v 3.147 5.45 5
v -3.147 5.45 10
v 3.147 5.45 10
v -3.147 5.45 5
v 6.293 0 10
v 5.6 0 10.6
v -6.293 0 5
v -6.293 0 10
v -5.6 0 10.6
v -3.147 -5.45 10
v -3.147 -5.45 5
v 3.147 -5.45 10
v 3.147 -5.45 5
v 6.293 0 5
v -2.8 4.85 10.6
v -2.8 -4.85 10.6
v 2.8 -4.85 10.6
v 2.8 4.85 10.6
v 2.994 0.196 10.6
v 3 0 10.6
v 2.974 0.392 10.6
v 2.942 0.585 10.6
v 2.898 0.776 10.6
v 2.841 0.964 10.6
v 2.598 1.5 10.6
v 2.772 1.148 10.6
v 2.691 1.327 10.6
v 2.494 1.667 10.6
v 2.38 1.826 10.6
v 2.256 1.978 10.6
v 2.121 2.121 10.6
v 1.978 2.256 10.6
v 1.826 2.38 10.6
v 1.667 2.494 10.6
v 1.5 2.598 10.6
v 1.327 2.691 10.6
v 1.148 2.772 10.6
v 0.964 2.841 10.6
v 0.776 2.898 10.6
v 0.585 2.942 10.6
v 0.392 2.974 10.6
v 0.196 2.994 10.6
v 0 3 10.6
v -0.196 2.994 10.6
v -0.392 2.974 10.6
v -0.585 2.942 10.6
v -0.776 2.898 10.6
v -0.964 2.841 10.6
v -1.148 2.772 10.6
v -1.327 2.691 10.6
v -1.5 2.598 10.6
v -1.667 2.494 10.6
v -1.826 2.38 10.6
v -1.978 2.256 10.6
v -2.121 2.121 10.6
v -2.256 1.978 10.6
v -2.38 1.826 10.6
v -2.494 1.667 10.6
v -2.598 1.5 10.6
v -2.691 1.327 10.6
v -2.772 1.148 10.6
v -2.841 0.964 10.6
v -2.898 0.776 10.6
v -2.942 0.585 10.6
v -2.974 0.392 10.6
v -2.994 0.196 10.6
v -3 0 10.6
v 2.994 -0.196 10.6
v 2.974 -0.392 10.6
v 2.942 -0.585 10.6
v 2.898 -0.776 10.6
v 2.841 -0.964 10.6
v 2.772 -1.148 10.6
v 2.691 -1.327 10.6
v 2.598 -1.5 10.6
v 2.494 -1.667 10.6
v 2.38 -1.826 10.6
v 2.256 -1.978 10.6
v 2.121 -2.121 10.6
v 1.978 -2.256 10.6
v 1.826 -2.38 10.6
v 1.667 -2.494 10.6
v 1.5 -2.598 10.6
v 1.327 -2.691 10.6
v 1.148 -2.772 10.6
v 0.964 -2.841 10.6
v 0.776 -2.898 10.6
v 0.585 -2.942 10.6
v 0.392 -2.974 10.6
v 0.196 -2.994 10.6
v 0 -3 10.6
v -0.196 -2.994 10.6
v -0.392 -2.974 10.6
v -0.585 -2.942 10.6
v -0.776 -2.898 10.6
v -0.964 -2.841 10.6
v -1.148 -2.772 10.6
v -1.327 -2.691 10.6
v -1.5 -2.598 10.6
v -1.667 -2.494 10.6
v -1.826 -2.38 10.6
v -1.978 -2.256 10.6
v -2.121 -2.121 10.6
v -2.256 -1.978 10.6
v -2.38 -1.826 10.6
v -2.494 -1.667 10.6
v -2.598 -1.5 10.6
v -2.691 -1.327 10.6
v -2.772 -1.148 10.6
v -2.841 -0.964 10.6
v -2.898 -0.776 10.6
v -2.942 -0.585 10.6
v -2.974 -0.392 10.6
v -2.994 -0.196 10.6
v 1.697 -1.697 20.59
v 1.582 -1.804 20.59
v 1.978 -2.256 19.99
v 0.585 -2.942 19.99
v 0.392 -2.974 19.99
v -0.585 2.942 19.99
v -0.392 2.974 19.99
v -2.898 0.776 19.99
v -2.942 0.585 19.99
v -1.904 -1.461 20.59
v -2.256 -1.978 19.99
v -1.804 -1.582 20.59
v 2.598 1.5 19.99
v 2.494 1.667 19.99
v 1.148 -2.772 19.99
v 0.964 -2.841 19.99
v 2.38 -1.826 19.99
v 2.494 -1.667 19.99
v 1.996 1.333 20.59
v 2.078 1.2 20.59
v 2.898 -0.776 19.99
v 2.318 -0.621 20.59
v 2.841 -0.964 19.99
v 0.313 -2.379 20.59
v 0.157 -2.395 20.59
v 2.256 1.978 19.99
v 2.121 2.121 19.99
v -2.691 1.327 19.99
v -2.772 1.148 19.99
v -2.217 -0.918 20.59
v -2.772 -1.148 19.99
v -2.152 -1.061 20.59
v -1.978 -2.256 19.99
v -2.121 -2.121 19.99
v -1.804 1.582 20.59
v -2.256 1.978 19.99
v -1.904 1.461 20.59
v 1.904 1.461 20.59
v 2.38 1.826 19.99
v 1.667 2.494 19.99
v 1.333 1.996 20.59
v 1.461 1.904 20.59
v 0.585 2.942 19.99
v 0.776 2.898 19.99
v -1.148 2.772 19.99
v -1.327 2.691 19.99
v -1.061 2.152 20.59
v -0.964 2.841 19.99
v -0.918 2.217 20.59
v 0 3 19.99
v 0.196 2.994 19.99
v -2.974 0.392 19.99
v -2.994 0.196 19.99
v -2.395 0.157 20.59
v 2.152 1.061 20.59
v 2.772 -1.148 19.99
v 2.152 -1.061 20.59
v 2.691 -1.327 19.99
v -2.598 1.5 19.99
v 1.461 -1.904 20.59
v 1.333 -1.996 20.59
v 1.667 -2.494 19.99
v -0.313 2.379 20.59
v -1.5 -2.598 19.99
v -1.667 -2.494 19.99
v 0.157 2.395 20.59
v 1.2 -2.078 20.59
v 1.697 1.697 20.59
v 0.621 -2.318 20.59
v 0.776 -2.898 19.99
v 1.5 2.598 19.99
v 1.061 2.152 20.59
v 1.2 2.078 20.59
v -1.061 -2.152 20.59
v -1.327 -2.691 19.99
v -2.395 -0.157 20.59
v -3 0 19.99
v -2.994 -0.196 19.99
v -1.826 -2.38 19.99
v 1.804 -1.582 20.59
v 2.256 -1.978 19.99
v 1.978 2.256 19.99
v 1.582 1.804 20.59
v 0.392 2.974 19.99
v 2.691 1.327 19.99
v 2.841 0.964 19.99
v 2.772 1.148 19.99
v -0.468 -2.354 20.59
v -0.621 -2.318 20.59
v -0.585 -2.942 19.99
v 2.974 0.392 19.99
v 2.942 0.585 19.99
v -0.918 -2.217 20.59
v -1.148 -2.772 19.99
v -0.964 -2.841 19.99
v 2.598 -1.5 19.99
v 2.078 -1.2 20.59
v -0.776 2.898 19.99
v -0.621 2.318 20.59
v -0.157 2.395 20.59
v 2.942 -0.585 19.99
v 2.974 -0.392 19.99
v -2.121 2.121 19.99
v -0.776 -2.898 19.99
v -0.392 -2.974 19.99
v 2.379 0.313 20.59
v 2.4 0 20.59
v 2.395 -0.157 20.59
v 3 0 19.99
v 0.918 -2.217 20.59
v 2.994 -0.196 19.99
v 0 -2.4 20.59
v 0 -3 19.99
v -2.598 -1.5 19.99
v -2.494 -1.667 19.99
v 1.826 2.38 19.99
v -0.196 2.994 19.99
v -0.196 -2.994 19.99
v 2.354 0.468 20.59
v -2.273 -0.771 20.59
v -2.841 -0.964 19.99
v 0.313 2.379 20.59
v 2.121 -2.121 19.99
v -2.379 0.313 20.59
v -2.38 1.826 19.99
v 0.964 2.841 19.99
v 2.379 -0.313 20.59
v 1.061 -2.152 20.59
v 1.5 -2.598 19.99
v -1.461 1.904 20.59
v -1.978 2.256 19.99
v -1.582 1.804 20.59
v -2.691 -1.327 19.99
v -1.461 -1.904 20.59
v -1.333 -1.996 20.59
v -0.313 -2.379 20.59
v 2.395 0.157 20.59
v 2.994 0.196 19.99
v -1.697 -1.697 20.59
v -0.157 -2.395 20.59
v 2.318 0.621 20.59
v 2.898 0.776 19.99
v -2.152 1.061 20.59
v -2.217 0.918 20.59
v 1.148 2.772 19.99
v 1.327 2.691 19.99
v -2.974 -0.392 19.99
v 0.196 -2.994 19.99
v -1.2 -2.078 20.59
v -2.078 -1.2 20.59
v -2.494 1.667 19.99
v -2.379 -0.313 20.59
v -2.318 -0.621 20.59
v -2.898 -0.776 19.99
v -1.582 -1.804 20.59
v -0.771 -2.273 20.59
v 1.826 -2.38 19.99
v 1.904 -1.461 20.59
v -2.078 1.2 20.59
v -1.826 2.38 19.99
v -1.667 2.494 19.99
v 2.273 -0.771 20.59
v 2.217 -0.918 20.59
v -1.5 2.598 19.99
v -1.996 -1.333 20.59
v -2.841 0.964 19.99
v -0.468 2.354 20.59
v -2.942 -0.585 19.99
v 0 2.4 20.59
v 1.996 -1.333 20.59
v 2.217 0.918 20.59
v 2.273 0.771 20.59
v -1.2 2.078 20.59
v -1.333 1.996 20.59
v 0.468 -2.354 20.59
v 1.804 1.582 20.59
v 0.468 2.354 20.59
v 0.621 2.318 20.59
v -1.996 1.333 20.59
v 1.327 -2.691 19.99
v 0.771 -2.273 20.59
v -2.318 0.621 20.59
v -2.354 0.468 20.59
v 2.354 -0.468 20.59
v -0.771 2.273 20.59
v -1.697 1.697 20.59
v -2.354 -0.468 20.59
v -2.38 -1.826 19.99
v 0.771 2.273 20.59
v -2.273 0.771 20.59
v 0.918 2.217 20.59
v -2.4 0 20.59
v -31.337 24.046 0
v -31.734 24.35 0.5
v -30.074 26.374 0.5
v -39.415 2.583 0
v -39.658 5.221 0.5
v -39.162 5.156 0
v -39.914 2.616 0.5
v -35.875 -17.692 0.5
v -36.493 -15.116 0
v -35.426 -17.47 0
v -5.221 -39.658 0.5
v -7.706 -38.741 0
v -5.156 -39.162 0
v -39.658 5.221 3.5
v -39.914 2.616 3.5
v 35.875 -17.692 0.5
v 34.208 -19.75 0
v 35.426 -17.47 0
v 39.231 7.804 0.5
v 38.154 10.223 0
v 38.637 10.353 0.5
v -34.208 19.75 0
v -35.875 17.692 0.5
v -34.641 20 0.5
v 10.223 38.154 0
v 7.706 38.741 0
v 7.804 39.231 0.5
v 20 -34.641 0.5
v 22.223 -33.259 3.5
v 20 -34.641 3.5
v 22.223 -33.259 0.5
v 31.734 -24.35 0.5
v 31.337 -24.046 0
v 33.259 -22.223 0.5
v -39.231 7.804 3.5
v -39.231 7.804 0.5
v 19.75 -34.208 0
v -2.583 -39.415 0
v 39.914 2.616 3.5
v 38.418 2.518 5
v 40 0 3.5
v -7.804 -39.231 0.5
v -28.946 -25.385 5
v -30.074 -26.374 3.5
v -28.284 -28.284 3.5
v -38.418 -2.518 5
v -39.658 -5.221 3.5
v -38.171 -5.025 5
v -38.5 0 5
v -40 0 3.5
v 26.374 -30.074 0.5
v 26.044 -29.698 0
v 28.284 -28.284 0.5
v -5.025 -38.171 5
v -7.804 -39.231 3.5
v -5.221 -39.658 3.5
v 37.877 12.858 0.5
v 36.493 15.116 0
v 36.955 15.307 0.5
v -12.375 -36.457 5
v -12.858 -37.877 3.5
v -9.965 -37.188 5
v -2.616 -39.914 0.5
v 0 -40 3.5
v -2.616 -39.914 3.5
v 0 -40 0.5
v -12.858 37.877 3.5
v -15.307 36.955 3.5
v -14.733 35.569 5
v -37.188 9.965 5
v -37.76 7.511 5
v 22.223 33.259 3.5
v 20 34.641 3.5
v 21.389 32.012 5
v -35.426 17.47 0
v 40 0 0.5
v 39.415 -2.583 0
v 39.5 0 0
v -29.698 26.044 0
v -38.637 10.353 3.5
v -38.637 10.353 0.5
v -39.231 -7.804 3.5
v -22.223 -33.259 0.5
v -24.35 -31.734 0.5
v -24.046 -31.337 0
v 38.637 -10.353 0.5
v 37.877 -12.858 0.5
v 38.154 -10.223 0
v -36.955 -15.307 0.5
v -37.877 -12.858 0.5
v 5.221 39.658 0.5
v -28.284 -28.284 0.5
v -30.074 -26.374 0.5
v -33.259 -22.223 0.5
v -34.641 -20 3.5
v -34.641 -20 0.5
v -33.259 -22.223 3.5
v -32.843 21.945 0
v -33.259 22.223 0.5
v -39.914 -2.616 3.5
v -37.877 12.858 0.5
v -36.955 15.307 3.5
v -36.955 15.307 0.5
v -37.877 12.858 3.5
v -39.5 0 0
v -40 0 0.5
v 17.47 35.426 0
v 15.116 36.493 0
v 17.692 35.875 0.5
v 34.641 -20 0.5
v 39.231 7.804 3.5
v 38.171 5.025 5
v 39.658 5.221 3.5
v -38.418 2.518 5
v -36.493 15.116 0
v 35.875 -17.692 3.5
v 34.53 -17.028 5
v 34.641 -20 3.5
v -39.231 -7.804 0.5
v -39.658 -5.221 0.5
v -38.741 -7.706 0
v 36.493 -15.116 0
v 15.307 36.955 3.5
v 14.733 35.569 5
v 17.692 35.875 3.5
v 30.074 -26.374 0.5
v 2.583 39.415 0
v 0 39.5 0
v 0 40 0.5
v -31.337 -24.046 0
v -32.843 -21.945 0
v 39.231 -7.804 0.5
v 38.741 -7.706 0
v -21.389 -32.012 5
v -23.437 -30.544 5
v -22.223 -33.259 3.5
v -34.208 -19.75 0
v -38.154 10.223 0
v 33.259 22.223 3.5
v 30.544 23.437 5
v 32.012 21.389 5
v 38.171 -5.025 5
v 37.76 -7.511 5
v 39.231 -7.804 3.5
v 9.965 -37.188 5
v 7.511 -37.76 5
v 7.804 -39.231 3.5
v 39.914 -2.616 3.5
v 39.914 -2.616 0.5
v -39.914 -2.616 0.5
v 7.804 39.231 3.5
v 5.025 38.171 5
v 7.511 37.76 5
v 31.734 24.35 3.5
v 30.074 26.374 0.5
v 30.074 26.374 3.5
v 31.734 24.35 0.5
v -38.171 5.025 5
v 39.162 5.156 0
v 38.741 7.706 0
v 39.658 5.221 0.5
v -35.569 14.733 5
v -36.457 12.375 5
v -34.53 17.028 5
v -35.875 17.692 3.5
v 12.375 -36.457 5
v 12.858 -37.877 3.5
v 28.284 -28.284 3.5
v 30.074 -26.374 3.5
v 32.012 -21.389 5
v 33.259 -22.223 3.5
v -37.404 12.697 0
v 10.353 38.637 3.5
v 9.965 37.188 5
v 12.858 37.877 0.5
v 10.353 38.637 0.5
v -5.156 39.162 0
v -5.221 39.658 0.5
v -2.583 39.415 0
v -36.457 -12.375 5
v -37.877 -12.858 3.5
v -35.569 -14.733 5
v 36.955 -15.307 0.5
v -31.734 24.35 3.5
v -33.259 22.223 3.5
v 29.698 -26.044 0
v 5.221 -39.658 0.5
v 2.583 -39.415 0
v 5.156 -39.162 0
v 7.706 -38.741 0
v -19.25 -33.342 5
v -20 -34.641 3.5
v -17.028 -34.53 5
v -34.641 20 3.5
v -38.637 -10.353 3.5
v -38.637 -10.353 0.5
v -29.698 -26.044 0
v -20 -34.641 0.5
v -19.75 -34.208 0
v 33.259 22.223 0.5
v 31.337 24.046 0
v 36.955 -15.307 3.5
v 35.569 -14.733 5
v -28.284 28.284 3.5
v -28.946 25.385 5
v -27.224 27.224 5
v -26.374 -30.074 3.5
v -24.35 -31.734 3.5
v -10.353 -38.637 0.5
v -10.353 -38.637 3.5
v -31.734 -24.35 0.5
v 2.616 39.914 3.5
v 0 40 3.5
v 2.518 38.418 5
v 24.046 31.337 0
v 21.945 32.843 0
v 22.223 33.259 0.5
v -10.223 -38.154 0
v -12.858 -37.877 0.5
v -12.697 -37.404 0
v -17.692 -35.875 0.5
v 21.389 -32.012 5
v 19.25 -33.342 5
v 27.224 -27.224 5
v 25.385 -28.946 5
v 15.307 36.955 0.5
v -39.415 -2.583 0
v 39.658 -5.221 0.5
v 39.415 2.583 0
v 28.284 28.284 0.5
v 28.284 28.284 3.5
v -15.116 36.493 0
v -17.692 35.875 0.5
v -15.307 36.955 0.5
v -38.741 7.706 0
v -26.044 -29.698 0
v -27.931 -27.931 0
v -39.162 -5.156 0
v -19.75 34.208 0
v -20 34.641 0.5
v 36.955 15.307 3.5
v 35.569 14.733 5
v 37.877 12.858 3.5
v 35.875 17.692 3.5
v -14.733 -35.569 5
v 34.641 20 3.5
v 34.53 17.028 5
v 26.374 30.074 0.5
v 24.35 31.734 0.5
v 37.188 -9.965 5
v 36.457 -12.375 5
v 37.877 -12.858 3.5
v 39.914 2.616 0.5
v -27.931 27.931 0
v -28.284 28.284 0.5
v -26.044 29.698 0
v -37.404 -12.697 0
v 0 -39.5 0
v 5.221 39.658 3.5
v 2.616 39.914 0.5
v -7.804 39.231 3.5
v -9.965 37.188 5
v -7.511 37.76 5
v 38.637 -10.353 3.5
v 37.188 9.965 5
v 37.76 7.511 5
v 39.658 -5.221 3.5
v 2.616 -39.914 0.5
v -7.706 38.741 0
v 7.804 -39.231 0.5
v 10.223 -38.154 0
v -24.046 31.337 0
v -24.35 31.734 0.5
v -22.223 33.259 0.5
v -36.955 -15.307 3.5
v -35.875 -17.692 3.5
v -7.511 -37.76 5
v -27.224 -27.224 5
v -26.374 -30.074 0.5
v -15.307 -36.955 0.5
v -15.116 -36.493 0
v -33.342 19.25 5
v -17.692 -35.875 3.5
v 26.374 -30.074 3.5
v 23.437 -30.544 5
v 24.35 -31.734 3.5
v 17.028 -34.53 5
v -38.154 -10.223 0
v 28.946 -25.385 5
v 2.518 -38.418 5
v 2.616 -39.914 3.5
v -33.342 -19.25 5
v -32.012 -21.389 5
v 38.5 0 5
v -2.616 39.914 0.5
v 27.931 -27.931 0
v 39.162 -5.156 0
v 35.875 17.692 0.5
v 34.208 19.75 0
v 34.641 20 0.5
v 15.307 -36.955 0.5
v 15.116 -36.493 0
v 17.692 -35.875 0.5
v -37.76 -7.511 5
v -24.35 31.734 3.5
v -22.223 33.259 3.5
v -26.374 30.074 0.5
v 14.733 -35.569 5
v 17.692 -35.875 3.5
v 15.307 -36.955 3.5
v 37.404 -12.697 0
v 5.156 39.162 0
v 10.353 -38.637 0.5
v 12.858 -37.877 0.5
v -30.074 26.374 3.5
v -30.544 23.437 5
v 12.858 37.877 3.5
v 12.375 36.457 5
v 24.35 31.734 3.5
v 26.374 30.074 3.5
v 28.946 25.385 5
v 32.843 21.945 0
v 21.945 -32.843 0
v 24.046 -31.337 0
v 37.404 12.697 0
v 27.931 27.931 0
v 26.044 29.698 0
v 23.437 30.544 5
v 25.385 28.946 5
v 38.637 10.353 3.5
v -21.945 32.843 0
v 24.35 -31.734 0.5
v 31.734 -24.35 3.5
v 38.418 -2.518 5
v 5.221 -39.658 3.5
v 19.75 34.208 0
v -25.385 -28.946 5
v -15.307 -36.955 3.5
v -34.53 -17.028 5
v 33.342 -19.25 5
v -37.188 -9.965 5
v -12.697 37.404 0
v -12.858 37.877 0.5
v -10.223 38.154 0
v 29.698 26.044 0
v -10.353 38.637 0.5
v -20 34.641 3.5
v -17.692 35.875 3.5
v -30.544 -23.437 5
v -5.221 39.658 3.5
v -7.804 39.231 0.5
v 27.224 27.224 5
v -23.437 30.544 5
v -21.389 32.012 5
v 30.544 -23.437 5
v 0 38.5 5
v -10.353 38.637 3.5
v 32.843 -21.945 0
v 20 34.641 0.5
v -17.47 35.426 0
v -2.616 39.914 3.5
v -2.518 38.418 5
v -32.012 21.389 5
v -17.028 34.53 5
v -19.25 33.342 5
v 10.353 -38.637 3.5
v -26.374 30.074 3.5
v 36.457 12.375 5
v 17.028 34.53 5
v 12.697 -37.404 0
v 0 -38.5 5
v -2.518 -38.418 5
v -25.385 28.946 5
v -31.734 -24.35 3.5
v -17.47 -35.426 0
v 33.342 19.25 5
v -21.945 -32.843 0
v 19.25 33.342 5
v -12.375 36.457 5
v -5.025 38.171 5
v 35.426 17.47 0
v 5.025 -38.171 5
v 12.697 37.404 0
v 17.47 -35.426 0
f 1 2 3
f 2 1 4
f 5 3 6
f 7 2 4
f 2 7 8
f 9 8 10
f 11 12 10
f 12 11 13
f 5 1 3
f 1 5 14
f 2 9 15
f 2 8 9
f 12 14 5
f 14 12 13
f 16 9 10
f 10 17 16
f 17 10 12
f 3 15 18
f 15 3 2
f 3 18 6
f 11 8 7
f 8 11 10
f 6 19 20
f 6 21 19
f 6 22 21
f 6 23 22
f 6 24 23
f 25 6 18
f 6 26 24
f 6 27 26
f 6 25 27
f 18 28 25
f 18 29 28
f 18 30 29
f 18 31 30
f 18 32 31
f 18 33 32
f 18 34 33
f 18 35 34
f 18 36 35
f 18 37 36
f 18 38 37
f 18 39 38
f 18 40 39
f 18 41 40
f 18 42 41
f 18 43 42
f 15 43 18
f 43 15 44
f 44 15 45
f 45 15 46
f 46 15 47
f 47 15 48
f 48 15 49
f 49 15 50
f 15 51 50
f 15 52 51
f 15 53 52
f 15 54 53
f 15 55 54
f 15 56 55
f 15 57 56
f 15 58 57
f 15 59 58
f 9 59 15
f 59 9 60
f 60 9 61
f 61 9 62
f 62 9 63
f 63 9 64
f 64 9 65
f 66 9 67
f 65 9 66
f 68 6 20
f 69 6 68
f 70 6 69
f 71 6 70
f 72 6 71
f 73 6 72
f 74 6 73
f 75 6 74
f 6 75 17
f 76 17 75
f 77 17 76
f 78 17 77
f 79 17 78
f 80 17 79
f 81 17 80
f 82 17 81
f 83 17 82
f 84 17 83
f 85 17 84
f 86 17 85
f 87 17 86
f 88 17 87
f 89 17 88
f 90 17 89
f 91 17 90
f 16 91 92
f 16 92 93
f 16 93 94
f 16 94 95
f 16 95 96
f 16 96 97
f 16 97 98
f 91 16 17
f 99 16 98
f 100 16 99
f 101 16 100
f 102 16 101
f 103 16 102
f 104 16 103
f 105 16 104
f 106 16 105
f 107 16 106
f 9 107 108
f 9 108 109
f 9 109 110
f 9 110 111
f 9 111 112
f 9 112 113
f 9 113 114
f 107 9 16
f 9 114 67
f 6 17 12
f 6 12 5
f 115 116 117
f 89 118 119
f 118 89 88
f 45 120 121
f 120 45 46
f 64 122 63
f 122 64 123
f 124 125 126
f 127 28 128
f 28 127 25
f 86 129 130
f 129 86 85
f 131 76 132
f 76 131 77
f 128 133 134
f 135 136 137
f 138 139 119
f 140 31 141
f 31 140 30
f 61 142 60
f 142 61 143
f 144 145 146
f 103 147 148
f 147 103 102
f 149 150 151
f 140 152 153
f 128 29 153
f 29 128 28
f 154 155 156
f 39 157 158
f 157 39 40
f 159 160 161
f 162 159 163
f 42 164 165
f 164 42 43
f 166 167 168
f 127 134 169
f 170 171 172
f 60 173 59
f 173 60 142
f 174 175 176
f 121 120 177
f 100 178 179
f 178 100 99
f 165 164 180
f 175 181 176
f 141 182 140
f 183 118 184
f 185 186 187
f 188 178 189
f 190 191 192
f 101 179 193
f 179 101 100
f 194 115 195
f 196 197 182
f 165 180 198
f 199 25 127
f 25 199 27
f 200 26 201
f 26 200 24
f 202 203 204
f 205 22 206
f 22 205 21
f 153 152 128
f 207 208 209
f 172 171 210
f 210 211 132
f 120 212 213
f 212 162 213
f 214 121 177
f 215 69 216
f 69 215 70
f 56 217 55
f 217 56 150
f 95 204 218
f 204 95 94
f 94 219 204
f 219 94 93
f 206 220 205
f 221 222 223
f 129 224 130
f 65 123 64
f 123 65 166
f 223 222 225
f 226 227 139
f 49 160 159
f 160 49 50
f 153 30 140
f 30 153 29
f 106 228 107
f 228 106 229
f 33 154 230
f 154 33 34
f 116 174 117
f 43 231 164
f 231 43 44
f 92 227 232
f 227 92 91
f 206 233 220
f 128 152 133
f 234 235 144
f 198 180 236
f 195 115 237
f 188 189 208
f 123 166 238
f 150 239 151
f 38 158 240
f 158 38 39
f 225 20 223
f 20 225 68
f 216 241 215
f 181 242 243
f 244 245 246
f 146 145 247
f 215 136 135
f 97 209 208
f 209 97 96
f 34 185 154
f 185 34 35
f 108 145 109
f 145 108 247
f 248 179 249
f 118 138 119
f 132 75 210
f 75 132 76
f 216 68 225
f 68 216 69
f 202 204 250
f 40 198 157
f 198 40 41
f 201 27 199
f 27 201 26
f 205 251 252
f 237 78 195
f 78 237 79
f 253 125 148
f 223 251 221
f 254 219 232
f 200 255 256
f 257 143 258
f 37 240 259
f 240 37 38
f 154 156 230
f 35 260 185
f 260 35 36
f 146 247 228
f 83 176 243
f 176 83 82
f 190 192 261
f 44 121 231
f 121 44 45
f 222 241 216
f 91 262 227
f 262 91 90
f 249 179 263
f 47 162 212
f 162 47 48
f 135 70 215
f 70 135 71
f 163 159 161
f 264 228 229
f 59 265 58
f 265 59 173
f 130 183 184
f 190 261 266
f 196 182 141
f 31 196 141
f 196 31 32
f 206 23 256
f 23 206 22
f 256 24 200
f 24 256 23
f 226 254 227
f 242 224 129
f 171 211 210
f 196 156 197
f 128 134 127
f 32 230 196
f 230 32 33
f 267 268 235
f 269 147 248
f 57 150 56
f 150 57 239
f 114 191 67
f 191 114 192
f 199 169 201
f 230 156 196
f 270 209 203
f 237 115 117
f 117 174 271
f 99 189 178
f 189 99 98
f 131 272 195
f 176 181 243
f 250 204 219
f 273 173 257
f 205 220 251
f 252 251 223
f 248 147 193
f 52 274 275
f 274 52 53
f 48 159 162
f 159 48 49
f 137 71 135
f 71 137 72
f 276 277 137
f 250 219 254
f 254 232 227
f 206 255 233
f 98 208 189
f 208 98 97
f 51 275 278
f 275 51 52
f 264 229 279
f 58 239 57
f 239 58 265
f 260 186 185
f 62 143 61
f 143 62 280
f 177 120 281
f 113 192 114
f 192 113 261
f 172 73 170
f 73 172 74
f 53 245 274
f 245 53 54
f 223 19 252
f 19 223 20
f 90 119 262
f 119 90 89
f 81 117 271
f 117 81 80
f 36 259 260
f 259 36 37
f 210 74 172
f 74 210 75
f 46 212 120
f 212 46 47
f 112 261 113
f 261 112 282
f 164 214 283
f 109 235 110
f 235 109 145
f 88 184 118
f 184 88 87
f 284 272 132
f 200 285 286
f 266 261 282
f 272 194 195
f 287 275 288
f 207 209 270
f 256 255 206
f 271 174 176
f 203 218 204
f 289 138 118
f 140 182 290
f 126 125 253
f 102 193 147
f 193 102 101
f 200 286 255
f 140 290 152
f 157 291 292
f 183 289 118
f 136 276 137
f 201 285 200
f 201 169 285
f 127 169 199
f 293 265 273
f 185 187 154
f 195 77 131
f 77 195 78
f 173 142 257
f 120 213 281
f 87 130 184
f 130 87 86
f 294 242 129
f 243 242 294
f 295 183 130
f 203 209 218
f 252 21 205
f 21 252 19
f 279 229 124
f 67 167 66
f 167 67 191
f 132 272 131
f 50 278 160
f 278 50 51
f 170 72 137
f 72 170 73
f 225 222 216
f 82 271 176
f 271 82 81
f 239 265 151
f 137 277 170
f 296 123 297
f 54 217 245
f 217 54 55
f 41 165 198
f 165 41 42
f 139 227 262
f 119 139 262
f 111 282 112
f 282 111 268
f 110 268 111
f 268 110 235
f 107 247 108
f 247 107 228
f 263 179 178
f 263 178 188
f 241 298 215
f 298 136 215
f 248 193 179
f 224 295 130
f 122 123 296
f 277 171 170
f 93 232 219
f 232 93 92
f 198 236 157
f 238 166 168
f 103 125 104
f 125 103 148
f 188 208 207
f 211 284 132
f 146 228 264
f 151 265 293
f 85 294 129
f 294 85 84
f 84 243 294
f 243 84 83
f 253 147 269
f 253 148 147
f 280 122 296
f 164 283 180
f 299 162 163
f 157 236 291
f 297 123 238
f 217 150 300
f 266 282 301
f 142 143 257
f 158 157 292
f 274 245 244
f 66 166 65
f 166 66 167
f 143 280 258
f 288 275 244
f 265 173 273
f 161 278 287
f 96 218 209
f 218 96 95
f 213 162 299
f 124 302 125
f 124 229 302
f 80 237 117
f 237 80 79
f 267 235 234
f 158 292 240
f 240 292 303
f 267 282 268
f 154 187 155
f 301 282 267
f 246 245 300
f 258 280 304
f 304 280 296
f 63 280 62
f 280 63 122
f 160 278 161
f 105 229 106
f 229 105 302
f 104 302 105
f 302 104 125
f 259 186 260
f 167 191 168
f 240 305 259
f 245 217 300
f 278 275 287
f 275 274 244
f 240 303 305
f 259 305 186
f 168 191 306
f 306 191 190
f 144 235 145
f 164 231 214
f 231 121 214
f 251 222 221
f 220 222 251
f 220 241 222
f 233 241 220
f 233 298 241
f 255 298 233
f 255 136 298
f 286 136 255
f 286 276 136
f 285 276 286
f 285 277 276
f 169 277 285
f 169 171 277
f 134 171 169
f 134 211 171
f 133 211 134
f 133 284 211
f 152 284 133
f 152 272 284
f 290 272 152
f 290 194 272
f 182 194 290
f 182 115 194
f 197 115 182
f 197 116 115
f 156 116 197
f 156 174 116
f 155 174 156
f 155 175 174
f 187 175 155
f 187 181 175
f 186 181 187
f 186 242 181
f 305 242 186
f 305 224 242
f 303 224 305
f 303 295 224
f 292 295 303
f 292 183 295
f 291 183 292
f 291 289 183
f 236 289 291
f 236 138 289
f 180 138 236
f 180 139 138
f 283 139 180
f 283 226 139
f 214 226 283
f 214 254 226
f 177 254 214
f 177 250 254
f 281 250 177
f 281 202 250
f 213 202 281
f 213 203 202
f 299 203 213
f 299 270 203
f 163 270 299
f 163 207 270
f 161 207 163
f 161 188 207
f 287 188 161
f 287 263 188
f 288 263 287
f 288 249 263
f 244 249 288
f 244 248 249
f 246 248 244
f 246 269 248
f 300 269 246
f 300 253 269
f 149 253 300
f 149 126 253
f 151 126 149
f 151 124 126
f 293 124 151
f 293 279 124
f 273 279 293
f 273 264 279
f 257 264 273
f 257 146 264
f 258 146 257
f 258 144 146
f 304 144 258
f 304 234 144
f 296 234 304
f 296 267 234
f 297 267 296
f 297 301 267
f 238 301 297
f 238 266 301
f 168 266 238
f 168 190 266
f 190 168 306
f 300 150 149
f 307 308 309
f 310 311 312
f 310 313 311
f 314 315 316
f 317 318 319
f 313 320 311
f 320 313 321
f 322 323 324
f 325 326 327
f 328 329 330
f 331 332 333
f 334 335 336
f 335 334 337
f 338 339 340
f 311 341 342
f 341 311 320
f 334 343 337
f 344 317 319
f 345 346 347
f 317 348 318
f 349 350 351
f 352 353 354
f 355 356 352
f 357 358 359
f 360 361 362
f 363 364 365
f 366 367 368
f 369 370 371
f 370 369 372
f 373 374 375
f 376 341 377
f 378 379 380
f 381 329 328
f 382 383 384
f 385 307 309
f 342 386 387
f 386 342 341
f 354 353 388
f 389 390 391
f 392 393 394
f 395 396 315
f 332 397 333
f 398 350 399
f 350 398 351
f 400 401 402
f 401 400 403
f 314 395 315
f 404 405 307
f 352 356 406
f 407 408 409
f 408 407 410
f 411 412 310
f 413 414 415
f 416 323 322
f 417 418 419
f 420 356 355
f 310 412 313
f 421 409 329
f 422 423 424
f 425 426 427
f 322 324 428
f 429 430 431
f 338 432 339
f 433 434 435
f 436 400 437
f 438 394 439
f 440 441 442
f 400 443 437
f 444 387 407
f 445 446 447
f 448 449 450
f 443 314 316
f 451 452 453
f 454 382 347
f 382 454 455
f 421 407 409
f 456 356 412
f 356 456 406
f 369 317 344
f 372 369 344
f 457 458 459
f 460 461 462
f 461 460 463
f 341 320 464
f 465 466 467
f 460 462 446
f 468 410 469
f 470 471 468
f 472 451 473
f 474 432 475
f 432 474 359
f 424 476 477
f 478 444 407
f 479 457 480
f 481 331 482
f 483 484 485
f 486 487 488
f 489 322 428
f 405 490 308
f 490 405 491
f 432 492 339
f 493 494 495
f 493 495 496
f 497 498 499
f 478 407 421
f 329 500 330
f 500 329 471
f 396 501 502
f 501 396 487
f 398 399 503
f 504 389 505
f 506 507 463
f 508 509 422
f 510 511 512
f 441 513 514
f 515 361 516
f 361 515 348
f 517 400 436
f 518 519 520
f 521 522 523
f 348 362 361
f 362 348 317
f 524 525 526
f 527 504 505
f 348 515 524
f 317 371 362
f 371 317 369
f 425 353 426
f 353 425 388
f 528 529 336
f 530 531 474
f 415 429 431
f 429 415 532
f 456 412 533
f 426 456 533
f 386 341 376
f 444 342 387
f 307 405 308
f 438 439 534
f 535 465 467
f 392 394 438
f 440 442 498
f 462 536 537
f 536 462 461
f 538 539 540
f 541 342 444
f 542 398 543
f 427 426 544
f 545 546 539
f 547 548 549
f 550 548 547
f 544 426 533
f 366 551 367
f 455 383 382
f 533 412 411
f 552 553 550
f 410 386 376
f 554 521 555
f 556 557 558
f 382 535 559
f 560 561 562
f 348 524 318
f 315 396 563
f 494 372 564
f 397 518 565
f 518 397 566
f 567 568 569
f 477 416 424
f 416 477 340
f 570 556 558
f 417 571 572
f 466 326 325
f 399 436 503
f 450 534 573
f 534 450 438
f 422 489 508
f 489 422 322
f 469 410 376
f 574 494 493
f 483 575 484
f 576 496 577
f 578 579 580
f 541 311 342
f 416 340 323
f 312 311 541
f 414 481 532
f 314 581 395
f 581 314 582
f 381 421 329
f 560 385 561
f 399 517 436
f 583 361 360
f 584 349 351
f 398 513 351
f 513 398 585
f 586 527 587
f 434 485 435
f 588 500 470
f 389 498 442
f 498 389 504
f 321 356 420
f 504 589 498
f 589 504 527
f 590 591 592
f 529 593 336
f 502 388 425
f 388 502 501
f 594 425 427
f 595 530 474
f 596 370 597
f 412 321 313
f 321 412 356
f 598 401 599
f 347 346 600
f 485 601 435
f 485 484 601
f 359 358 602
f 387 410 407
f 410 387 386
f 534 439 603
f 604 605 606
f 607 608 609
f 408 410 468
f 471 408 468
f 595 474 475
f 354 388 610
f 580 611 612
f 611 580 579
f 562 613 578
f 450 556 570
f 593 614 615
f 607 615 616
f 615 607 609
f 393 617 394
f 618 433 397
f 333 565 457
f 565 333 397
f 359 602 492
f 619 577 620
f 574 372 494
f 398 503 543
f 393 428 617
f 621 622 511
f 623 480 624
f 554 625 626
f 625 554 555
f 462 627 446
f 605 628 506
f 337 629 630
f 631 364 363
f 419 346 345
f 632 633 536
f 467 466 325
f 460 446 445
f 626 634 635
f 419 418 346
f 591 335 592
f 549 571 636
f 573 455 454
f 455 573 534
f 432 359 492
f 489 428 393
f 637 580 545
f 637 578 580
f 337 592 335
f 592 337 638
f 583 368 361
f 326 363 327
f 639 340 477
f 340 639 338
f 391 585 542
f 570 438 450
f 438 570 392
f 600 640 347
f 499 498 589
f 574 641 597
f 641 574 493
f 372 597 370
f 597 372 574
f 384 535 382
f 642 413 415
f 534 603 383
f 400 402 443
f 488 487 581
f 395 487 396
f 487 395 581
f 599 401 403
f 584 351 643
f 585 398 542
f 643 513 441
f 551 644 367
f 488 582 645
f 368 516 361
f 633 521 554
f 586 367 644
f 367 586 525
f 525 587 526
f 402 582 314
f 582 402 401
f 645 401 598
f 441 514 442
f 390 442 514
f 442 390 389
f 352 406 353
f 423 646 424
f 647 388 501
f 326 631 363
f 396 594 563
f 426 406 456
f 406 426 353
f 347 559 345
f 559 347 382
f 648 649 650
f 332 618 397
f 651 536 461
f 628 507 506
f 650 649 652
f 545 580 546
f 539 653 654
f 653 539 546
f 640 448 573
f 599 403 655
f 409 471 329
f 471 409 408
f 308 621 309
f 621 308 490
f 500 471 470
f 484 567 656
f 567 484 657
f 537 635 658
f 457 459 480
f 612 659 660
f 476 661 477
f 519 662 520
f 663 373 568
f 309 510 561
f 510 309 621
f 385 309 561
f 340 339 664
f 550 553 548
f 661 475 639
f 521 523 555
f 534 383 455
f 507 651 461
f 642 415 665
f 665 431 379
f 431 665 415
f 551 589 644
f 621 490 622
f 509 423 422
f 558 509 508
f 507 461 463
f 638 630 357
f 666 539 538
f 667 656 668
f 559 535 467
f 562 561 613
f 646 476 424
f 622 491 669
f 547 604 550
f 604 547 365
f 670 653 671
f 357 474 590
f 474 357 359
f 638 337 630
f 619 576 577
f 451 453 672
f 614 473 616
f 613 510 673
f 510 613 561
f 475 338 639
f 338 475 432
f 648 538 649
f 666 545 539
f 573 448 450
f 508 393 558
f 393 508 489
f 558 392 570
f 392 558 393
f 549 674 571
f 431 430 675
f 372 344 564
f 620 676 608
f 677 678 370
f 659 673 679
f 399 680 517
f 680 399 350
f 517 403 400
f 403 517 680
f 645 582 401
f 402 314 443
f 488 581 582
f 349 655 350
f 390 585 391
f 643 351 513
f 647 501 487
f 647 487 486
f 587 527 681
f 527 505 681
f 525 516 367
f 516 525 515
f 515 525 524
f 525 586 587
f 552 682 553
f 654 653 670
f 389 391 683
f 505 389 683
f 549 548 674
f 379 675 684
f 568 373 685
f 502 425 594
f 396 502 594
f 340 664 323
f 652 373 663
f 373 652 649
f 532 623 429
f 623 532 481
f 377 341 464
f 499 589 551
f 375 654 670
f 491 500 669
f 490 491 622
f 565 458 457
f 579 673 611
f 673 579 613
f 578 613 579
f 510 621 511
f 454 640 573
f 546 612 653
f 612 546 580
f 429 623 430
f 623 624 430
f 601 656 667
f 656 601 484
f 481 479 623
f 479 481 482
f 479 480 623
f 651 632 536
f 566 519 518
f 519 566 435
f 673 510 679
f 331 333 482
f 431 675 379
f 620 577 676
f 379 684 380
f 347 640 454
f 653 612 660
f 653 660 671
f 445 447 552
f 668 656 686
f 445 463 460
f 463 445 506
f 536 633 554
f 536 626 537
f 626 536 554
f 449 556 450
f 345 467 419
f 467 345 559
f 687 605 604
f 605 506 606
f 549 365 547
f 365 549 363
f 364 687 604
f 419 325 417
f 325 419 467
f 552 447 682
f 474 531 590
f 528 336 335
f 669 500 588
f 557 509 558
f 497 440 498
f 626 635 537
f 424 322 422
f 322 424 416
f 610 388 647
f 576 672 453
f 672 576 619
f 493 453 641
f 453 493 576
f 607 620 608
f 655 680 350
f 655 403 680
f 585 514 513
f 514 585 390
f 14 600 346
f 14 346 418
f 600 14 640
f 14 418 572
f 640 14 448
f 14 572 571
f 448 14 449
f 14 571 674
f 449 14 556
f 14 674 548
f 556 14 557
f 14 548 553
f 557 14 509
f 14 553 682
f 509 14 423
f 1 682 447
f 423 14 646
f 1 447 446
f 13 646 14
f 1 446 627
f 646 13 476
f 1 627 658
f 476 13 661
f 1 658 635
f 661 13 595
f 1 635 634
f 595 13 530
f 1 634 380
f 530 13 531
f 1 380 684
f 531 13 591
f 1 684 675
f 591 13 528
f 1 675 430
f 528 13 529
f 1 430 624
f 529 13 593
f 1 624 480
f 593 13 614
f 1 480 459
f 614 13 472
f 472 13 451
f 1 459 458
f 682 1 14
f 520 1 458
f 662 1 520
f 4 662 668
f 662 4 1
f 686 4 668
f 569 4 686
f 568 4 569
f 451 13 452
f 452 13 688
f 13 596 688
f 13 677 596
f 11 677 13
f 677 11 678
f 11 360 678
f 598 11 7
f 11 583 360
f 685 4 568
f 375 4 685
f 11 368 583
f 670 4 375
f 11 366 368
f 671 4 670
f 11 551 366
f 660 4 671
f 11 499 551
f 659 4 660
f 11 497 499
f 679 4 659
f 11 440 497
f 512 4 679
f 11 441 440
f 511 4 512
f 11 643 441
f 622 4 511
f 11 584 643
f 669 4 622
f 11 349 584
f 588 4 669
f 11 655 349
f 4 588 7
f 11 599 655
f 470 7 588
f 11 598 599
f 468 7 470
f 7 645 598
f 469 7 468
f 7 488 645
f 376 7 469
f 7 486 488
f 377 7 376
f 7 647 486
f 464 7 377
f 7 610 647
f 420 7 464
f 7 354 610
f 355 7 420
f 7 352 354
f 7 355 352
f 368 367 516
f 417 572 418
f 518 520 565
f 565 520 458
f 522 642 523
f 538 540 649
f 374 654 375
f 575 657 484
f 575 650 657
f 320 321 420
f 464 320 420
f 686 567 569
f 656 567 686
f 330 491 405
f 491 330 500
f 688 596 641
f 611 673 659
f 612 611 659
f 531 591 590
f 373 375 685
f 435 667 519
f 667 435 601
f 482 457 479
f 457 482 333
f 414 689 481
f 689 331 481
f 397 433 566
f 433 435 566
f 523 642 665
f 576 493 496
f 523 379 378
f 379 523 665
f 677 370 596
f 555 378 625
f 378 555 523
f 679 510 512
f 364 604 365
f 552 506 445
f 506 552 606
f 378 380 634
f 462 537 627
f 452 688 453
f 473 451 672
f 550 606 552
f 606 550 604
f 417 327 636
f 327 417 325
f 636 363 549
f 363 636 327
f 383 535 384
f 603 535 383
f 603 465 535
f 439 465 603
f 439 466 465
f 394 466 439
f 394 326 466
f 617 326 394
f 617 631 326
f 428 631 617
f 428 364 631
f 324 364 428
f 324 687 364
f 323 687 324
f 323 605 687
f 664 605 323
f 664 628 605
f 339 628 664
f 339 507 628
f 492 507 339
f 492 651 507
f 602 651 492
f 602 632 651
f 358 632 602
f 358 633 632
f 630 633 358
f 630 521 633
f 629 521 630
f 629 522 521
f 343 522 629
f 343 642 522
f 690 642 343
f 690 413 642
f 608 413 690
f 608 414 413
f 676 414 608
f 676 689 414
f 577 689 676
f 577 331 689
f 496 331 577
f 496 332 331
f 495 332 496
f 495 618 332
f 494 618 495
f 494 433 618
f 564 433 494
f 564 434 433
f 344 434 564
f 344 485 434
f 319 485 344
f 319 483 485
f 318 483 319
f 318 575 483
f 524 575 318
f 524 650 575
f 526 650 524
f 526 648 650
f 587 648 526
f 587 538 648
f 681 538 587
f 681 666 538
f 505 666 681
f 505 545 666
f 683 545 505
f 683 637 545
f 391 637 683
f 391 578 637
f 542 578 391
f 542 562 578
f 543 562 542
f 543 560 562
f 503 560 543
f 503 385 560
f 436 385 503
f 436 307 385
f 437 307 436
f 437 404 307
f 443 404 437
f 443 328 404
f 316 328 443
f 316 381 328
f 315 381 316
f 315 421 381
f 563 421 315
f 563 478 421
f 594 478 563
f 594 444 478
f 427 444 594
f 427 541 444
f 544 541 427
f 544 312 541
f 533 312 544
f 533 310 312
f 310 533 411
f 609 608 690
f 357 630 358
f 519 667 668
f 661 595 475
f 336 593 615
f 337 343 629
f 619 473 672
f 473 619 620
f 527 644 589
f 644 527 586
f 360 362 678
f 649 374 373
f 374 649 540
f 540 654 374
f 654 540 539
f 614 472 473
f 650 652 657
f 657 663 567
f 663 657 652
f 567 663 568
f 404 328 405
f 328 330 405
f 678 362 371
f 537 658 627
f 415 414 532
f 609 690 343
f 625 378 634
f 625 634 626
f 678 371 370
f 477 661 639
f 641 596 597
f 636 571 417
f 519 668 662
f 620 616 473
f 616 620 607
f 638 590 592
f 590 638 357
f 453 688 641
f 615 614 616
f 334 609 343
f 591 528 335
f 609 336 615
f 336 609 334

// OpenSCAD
// Round desk base for eye_test_stand.scad: a hex pillar that drops into the stem's 1/4"-20 nut
// pocket, plus a pin up the screw hole above it so the stand doesn't wobble. The eye stands
// upright (no tilt - eye_test_foot.scad is the tilted alternative).
// PRINT as modelled (disc on the bed), no supports.
include <../params.scad>

base_d   = 80;
base_t   = 5;
chamfer  = 1.5;                 // round the top edge
foot     = 0.5;                 // small bottom chamfer (elephant's foot)

// The stand's pocket (eye_test_stand.scad: nut_14 = 11.41 across flats x 5.9 deep, then a
// 6.6 screw hole 12 mm further). Both printed sideways in the stem, so they come out ~0.4 small.
hex_af   = 10.9;                // across flats as drawn: prints ~10.8 in a ~11.0 pocket
hex_h    = 5.6;                 // just under the pocket depth, so the stem end sits on the disc
pin_d    = 6.0;                 // prints ~5.9 in a ~6.2 hole
pin_h    = 10;                  // above the hex (the hole goes 12.1)
lead     = 0.6;                 // lead-in chamfers

$fn = 96;

module disc() {
    hull() {
        cylinder(d = base_d - 2 * foot, h = 0.01);
        translate([0, 0, foot]) cylinder(d = base_d, h = base_t - foot - chamfer);
        translate([0, 0, base_t - 0.01]) cylinder(d = base_d - 2 * chamfer, h = 0.01);
    }
}

module hex(af, h) {
    d = af / cos(30);
    hull() {
        cylinder(d = d, h = h - lead, $fn = 6);
        cylinder(d = d - 2 * lead / cos(30), h = h, $fn = 6);
    }
}

module pin() {
    hull() {
        cylinder(d = pin_d, h = pin_h - lead);
        cylinder(d = pin_d - 2 * lead, h = pin_h);
    }
}

union() {
    disc();
    translate([0, 0, base_t - 0.01]) {
        hex(hex_af, hex_h + 0.01);
        translate([0, 0, hex_h]) pin();
    }
}
